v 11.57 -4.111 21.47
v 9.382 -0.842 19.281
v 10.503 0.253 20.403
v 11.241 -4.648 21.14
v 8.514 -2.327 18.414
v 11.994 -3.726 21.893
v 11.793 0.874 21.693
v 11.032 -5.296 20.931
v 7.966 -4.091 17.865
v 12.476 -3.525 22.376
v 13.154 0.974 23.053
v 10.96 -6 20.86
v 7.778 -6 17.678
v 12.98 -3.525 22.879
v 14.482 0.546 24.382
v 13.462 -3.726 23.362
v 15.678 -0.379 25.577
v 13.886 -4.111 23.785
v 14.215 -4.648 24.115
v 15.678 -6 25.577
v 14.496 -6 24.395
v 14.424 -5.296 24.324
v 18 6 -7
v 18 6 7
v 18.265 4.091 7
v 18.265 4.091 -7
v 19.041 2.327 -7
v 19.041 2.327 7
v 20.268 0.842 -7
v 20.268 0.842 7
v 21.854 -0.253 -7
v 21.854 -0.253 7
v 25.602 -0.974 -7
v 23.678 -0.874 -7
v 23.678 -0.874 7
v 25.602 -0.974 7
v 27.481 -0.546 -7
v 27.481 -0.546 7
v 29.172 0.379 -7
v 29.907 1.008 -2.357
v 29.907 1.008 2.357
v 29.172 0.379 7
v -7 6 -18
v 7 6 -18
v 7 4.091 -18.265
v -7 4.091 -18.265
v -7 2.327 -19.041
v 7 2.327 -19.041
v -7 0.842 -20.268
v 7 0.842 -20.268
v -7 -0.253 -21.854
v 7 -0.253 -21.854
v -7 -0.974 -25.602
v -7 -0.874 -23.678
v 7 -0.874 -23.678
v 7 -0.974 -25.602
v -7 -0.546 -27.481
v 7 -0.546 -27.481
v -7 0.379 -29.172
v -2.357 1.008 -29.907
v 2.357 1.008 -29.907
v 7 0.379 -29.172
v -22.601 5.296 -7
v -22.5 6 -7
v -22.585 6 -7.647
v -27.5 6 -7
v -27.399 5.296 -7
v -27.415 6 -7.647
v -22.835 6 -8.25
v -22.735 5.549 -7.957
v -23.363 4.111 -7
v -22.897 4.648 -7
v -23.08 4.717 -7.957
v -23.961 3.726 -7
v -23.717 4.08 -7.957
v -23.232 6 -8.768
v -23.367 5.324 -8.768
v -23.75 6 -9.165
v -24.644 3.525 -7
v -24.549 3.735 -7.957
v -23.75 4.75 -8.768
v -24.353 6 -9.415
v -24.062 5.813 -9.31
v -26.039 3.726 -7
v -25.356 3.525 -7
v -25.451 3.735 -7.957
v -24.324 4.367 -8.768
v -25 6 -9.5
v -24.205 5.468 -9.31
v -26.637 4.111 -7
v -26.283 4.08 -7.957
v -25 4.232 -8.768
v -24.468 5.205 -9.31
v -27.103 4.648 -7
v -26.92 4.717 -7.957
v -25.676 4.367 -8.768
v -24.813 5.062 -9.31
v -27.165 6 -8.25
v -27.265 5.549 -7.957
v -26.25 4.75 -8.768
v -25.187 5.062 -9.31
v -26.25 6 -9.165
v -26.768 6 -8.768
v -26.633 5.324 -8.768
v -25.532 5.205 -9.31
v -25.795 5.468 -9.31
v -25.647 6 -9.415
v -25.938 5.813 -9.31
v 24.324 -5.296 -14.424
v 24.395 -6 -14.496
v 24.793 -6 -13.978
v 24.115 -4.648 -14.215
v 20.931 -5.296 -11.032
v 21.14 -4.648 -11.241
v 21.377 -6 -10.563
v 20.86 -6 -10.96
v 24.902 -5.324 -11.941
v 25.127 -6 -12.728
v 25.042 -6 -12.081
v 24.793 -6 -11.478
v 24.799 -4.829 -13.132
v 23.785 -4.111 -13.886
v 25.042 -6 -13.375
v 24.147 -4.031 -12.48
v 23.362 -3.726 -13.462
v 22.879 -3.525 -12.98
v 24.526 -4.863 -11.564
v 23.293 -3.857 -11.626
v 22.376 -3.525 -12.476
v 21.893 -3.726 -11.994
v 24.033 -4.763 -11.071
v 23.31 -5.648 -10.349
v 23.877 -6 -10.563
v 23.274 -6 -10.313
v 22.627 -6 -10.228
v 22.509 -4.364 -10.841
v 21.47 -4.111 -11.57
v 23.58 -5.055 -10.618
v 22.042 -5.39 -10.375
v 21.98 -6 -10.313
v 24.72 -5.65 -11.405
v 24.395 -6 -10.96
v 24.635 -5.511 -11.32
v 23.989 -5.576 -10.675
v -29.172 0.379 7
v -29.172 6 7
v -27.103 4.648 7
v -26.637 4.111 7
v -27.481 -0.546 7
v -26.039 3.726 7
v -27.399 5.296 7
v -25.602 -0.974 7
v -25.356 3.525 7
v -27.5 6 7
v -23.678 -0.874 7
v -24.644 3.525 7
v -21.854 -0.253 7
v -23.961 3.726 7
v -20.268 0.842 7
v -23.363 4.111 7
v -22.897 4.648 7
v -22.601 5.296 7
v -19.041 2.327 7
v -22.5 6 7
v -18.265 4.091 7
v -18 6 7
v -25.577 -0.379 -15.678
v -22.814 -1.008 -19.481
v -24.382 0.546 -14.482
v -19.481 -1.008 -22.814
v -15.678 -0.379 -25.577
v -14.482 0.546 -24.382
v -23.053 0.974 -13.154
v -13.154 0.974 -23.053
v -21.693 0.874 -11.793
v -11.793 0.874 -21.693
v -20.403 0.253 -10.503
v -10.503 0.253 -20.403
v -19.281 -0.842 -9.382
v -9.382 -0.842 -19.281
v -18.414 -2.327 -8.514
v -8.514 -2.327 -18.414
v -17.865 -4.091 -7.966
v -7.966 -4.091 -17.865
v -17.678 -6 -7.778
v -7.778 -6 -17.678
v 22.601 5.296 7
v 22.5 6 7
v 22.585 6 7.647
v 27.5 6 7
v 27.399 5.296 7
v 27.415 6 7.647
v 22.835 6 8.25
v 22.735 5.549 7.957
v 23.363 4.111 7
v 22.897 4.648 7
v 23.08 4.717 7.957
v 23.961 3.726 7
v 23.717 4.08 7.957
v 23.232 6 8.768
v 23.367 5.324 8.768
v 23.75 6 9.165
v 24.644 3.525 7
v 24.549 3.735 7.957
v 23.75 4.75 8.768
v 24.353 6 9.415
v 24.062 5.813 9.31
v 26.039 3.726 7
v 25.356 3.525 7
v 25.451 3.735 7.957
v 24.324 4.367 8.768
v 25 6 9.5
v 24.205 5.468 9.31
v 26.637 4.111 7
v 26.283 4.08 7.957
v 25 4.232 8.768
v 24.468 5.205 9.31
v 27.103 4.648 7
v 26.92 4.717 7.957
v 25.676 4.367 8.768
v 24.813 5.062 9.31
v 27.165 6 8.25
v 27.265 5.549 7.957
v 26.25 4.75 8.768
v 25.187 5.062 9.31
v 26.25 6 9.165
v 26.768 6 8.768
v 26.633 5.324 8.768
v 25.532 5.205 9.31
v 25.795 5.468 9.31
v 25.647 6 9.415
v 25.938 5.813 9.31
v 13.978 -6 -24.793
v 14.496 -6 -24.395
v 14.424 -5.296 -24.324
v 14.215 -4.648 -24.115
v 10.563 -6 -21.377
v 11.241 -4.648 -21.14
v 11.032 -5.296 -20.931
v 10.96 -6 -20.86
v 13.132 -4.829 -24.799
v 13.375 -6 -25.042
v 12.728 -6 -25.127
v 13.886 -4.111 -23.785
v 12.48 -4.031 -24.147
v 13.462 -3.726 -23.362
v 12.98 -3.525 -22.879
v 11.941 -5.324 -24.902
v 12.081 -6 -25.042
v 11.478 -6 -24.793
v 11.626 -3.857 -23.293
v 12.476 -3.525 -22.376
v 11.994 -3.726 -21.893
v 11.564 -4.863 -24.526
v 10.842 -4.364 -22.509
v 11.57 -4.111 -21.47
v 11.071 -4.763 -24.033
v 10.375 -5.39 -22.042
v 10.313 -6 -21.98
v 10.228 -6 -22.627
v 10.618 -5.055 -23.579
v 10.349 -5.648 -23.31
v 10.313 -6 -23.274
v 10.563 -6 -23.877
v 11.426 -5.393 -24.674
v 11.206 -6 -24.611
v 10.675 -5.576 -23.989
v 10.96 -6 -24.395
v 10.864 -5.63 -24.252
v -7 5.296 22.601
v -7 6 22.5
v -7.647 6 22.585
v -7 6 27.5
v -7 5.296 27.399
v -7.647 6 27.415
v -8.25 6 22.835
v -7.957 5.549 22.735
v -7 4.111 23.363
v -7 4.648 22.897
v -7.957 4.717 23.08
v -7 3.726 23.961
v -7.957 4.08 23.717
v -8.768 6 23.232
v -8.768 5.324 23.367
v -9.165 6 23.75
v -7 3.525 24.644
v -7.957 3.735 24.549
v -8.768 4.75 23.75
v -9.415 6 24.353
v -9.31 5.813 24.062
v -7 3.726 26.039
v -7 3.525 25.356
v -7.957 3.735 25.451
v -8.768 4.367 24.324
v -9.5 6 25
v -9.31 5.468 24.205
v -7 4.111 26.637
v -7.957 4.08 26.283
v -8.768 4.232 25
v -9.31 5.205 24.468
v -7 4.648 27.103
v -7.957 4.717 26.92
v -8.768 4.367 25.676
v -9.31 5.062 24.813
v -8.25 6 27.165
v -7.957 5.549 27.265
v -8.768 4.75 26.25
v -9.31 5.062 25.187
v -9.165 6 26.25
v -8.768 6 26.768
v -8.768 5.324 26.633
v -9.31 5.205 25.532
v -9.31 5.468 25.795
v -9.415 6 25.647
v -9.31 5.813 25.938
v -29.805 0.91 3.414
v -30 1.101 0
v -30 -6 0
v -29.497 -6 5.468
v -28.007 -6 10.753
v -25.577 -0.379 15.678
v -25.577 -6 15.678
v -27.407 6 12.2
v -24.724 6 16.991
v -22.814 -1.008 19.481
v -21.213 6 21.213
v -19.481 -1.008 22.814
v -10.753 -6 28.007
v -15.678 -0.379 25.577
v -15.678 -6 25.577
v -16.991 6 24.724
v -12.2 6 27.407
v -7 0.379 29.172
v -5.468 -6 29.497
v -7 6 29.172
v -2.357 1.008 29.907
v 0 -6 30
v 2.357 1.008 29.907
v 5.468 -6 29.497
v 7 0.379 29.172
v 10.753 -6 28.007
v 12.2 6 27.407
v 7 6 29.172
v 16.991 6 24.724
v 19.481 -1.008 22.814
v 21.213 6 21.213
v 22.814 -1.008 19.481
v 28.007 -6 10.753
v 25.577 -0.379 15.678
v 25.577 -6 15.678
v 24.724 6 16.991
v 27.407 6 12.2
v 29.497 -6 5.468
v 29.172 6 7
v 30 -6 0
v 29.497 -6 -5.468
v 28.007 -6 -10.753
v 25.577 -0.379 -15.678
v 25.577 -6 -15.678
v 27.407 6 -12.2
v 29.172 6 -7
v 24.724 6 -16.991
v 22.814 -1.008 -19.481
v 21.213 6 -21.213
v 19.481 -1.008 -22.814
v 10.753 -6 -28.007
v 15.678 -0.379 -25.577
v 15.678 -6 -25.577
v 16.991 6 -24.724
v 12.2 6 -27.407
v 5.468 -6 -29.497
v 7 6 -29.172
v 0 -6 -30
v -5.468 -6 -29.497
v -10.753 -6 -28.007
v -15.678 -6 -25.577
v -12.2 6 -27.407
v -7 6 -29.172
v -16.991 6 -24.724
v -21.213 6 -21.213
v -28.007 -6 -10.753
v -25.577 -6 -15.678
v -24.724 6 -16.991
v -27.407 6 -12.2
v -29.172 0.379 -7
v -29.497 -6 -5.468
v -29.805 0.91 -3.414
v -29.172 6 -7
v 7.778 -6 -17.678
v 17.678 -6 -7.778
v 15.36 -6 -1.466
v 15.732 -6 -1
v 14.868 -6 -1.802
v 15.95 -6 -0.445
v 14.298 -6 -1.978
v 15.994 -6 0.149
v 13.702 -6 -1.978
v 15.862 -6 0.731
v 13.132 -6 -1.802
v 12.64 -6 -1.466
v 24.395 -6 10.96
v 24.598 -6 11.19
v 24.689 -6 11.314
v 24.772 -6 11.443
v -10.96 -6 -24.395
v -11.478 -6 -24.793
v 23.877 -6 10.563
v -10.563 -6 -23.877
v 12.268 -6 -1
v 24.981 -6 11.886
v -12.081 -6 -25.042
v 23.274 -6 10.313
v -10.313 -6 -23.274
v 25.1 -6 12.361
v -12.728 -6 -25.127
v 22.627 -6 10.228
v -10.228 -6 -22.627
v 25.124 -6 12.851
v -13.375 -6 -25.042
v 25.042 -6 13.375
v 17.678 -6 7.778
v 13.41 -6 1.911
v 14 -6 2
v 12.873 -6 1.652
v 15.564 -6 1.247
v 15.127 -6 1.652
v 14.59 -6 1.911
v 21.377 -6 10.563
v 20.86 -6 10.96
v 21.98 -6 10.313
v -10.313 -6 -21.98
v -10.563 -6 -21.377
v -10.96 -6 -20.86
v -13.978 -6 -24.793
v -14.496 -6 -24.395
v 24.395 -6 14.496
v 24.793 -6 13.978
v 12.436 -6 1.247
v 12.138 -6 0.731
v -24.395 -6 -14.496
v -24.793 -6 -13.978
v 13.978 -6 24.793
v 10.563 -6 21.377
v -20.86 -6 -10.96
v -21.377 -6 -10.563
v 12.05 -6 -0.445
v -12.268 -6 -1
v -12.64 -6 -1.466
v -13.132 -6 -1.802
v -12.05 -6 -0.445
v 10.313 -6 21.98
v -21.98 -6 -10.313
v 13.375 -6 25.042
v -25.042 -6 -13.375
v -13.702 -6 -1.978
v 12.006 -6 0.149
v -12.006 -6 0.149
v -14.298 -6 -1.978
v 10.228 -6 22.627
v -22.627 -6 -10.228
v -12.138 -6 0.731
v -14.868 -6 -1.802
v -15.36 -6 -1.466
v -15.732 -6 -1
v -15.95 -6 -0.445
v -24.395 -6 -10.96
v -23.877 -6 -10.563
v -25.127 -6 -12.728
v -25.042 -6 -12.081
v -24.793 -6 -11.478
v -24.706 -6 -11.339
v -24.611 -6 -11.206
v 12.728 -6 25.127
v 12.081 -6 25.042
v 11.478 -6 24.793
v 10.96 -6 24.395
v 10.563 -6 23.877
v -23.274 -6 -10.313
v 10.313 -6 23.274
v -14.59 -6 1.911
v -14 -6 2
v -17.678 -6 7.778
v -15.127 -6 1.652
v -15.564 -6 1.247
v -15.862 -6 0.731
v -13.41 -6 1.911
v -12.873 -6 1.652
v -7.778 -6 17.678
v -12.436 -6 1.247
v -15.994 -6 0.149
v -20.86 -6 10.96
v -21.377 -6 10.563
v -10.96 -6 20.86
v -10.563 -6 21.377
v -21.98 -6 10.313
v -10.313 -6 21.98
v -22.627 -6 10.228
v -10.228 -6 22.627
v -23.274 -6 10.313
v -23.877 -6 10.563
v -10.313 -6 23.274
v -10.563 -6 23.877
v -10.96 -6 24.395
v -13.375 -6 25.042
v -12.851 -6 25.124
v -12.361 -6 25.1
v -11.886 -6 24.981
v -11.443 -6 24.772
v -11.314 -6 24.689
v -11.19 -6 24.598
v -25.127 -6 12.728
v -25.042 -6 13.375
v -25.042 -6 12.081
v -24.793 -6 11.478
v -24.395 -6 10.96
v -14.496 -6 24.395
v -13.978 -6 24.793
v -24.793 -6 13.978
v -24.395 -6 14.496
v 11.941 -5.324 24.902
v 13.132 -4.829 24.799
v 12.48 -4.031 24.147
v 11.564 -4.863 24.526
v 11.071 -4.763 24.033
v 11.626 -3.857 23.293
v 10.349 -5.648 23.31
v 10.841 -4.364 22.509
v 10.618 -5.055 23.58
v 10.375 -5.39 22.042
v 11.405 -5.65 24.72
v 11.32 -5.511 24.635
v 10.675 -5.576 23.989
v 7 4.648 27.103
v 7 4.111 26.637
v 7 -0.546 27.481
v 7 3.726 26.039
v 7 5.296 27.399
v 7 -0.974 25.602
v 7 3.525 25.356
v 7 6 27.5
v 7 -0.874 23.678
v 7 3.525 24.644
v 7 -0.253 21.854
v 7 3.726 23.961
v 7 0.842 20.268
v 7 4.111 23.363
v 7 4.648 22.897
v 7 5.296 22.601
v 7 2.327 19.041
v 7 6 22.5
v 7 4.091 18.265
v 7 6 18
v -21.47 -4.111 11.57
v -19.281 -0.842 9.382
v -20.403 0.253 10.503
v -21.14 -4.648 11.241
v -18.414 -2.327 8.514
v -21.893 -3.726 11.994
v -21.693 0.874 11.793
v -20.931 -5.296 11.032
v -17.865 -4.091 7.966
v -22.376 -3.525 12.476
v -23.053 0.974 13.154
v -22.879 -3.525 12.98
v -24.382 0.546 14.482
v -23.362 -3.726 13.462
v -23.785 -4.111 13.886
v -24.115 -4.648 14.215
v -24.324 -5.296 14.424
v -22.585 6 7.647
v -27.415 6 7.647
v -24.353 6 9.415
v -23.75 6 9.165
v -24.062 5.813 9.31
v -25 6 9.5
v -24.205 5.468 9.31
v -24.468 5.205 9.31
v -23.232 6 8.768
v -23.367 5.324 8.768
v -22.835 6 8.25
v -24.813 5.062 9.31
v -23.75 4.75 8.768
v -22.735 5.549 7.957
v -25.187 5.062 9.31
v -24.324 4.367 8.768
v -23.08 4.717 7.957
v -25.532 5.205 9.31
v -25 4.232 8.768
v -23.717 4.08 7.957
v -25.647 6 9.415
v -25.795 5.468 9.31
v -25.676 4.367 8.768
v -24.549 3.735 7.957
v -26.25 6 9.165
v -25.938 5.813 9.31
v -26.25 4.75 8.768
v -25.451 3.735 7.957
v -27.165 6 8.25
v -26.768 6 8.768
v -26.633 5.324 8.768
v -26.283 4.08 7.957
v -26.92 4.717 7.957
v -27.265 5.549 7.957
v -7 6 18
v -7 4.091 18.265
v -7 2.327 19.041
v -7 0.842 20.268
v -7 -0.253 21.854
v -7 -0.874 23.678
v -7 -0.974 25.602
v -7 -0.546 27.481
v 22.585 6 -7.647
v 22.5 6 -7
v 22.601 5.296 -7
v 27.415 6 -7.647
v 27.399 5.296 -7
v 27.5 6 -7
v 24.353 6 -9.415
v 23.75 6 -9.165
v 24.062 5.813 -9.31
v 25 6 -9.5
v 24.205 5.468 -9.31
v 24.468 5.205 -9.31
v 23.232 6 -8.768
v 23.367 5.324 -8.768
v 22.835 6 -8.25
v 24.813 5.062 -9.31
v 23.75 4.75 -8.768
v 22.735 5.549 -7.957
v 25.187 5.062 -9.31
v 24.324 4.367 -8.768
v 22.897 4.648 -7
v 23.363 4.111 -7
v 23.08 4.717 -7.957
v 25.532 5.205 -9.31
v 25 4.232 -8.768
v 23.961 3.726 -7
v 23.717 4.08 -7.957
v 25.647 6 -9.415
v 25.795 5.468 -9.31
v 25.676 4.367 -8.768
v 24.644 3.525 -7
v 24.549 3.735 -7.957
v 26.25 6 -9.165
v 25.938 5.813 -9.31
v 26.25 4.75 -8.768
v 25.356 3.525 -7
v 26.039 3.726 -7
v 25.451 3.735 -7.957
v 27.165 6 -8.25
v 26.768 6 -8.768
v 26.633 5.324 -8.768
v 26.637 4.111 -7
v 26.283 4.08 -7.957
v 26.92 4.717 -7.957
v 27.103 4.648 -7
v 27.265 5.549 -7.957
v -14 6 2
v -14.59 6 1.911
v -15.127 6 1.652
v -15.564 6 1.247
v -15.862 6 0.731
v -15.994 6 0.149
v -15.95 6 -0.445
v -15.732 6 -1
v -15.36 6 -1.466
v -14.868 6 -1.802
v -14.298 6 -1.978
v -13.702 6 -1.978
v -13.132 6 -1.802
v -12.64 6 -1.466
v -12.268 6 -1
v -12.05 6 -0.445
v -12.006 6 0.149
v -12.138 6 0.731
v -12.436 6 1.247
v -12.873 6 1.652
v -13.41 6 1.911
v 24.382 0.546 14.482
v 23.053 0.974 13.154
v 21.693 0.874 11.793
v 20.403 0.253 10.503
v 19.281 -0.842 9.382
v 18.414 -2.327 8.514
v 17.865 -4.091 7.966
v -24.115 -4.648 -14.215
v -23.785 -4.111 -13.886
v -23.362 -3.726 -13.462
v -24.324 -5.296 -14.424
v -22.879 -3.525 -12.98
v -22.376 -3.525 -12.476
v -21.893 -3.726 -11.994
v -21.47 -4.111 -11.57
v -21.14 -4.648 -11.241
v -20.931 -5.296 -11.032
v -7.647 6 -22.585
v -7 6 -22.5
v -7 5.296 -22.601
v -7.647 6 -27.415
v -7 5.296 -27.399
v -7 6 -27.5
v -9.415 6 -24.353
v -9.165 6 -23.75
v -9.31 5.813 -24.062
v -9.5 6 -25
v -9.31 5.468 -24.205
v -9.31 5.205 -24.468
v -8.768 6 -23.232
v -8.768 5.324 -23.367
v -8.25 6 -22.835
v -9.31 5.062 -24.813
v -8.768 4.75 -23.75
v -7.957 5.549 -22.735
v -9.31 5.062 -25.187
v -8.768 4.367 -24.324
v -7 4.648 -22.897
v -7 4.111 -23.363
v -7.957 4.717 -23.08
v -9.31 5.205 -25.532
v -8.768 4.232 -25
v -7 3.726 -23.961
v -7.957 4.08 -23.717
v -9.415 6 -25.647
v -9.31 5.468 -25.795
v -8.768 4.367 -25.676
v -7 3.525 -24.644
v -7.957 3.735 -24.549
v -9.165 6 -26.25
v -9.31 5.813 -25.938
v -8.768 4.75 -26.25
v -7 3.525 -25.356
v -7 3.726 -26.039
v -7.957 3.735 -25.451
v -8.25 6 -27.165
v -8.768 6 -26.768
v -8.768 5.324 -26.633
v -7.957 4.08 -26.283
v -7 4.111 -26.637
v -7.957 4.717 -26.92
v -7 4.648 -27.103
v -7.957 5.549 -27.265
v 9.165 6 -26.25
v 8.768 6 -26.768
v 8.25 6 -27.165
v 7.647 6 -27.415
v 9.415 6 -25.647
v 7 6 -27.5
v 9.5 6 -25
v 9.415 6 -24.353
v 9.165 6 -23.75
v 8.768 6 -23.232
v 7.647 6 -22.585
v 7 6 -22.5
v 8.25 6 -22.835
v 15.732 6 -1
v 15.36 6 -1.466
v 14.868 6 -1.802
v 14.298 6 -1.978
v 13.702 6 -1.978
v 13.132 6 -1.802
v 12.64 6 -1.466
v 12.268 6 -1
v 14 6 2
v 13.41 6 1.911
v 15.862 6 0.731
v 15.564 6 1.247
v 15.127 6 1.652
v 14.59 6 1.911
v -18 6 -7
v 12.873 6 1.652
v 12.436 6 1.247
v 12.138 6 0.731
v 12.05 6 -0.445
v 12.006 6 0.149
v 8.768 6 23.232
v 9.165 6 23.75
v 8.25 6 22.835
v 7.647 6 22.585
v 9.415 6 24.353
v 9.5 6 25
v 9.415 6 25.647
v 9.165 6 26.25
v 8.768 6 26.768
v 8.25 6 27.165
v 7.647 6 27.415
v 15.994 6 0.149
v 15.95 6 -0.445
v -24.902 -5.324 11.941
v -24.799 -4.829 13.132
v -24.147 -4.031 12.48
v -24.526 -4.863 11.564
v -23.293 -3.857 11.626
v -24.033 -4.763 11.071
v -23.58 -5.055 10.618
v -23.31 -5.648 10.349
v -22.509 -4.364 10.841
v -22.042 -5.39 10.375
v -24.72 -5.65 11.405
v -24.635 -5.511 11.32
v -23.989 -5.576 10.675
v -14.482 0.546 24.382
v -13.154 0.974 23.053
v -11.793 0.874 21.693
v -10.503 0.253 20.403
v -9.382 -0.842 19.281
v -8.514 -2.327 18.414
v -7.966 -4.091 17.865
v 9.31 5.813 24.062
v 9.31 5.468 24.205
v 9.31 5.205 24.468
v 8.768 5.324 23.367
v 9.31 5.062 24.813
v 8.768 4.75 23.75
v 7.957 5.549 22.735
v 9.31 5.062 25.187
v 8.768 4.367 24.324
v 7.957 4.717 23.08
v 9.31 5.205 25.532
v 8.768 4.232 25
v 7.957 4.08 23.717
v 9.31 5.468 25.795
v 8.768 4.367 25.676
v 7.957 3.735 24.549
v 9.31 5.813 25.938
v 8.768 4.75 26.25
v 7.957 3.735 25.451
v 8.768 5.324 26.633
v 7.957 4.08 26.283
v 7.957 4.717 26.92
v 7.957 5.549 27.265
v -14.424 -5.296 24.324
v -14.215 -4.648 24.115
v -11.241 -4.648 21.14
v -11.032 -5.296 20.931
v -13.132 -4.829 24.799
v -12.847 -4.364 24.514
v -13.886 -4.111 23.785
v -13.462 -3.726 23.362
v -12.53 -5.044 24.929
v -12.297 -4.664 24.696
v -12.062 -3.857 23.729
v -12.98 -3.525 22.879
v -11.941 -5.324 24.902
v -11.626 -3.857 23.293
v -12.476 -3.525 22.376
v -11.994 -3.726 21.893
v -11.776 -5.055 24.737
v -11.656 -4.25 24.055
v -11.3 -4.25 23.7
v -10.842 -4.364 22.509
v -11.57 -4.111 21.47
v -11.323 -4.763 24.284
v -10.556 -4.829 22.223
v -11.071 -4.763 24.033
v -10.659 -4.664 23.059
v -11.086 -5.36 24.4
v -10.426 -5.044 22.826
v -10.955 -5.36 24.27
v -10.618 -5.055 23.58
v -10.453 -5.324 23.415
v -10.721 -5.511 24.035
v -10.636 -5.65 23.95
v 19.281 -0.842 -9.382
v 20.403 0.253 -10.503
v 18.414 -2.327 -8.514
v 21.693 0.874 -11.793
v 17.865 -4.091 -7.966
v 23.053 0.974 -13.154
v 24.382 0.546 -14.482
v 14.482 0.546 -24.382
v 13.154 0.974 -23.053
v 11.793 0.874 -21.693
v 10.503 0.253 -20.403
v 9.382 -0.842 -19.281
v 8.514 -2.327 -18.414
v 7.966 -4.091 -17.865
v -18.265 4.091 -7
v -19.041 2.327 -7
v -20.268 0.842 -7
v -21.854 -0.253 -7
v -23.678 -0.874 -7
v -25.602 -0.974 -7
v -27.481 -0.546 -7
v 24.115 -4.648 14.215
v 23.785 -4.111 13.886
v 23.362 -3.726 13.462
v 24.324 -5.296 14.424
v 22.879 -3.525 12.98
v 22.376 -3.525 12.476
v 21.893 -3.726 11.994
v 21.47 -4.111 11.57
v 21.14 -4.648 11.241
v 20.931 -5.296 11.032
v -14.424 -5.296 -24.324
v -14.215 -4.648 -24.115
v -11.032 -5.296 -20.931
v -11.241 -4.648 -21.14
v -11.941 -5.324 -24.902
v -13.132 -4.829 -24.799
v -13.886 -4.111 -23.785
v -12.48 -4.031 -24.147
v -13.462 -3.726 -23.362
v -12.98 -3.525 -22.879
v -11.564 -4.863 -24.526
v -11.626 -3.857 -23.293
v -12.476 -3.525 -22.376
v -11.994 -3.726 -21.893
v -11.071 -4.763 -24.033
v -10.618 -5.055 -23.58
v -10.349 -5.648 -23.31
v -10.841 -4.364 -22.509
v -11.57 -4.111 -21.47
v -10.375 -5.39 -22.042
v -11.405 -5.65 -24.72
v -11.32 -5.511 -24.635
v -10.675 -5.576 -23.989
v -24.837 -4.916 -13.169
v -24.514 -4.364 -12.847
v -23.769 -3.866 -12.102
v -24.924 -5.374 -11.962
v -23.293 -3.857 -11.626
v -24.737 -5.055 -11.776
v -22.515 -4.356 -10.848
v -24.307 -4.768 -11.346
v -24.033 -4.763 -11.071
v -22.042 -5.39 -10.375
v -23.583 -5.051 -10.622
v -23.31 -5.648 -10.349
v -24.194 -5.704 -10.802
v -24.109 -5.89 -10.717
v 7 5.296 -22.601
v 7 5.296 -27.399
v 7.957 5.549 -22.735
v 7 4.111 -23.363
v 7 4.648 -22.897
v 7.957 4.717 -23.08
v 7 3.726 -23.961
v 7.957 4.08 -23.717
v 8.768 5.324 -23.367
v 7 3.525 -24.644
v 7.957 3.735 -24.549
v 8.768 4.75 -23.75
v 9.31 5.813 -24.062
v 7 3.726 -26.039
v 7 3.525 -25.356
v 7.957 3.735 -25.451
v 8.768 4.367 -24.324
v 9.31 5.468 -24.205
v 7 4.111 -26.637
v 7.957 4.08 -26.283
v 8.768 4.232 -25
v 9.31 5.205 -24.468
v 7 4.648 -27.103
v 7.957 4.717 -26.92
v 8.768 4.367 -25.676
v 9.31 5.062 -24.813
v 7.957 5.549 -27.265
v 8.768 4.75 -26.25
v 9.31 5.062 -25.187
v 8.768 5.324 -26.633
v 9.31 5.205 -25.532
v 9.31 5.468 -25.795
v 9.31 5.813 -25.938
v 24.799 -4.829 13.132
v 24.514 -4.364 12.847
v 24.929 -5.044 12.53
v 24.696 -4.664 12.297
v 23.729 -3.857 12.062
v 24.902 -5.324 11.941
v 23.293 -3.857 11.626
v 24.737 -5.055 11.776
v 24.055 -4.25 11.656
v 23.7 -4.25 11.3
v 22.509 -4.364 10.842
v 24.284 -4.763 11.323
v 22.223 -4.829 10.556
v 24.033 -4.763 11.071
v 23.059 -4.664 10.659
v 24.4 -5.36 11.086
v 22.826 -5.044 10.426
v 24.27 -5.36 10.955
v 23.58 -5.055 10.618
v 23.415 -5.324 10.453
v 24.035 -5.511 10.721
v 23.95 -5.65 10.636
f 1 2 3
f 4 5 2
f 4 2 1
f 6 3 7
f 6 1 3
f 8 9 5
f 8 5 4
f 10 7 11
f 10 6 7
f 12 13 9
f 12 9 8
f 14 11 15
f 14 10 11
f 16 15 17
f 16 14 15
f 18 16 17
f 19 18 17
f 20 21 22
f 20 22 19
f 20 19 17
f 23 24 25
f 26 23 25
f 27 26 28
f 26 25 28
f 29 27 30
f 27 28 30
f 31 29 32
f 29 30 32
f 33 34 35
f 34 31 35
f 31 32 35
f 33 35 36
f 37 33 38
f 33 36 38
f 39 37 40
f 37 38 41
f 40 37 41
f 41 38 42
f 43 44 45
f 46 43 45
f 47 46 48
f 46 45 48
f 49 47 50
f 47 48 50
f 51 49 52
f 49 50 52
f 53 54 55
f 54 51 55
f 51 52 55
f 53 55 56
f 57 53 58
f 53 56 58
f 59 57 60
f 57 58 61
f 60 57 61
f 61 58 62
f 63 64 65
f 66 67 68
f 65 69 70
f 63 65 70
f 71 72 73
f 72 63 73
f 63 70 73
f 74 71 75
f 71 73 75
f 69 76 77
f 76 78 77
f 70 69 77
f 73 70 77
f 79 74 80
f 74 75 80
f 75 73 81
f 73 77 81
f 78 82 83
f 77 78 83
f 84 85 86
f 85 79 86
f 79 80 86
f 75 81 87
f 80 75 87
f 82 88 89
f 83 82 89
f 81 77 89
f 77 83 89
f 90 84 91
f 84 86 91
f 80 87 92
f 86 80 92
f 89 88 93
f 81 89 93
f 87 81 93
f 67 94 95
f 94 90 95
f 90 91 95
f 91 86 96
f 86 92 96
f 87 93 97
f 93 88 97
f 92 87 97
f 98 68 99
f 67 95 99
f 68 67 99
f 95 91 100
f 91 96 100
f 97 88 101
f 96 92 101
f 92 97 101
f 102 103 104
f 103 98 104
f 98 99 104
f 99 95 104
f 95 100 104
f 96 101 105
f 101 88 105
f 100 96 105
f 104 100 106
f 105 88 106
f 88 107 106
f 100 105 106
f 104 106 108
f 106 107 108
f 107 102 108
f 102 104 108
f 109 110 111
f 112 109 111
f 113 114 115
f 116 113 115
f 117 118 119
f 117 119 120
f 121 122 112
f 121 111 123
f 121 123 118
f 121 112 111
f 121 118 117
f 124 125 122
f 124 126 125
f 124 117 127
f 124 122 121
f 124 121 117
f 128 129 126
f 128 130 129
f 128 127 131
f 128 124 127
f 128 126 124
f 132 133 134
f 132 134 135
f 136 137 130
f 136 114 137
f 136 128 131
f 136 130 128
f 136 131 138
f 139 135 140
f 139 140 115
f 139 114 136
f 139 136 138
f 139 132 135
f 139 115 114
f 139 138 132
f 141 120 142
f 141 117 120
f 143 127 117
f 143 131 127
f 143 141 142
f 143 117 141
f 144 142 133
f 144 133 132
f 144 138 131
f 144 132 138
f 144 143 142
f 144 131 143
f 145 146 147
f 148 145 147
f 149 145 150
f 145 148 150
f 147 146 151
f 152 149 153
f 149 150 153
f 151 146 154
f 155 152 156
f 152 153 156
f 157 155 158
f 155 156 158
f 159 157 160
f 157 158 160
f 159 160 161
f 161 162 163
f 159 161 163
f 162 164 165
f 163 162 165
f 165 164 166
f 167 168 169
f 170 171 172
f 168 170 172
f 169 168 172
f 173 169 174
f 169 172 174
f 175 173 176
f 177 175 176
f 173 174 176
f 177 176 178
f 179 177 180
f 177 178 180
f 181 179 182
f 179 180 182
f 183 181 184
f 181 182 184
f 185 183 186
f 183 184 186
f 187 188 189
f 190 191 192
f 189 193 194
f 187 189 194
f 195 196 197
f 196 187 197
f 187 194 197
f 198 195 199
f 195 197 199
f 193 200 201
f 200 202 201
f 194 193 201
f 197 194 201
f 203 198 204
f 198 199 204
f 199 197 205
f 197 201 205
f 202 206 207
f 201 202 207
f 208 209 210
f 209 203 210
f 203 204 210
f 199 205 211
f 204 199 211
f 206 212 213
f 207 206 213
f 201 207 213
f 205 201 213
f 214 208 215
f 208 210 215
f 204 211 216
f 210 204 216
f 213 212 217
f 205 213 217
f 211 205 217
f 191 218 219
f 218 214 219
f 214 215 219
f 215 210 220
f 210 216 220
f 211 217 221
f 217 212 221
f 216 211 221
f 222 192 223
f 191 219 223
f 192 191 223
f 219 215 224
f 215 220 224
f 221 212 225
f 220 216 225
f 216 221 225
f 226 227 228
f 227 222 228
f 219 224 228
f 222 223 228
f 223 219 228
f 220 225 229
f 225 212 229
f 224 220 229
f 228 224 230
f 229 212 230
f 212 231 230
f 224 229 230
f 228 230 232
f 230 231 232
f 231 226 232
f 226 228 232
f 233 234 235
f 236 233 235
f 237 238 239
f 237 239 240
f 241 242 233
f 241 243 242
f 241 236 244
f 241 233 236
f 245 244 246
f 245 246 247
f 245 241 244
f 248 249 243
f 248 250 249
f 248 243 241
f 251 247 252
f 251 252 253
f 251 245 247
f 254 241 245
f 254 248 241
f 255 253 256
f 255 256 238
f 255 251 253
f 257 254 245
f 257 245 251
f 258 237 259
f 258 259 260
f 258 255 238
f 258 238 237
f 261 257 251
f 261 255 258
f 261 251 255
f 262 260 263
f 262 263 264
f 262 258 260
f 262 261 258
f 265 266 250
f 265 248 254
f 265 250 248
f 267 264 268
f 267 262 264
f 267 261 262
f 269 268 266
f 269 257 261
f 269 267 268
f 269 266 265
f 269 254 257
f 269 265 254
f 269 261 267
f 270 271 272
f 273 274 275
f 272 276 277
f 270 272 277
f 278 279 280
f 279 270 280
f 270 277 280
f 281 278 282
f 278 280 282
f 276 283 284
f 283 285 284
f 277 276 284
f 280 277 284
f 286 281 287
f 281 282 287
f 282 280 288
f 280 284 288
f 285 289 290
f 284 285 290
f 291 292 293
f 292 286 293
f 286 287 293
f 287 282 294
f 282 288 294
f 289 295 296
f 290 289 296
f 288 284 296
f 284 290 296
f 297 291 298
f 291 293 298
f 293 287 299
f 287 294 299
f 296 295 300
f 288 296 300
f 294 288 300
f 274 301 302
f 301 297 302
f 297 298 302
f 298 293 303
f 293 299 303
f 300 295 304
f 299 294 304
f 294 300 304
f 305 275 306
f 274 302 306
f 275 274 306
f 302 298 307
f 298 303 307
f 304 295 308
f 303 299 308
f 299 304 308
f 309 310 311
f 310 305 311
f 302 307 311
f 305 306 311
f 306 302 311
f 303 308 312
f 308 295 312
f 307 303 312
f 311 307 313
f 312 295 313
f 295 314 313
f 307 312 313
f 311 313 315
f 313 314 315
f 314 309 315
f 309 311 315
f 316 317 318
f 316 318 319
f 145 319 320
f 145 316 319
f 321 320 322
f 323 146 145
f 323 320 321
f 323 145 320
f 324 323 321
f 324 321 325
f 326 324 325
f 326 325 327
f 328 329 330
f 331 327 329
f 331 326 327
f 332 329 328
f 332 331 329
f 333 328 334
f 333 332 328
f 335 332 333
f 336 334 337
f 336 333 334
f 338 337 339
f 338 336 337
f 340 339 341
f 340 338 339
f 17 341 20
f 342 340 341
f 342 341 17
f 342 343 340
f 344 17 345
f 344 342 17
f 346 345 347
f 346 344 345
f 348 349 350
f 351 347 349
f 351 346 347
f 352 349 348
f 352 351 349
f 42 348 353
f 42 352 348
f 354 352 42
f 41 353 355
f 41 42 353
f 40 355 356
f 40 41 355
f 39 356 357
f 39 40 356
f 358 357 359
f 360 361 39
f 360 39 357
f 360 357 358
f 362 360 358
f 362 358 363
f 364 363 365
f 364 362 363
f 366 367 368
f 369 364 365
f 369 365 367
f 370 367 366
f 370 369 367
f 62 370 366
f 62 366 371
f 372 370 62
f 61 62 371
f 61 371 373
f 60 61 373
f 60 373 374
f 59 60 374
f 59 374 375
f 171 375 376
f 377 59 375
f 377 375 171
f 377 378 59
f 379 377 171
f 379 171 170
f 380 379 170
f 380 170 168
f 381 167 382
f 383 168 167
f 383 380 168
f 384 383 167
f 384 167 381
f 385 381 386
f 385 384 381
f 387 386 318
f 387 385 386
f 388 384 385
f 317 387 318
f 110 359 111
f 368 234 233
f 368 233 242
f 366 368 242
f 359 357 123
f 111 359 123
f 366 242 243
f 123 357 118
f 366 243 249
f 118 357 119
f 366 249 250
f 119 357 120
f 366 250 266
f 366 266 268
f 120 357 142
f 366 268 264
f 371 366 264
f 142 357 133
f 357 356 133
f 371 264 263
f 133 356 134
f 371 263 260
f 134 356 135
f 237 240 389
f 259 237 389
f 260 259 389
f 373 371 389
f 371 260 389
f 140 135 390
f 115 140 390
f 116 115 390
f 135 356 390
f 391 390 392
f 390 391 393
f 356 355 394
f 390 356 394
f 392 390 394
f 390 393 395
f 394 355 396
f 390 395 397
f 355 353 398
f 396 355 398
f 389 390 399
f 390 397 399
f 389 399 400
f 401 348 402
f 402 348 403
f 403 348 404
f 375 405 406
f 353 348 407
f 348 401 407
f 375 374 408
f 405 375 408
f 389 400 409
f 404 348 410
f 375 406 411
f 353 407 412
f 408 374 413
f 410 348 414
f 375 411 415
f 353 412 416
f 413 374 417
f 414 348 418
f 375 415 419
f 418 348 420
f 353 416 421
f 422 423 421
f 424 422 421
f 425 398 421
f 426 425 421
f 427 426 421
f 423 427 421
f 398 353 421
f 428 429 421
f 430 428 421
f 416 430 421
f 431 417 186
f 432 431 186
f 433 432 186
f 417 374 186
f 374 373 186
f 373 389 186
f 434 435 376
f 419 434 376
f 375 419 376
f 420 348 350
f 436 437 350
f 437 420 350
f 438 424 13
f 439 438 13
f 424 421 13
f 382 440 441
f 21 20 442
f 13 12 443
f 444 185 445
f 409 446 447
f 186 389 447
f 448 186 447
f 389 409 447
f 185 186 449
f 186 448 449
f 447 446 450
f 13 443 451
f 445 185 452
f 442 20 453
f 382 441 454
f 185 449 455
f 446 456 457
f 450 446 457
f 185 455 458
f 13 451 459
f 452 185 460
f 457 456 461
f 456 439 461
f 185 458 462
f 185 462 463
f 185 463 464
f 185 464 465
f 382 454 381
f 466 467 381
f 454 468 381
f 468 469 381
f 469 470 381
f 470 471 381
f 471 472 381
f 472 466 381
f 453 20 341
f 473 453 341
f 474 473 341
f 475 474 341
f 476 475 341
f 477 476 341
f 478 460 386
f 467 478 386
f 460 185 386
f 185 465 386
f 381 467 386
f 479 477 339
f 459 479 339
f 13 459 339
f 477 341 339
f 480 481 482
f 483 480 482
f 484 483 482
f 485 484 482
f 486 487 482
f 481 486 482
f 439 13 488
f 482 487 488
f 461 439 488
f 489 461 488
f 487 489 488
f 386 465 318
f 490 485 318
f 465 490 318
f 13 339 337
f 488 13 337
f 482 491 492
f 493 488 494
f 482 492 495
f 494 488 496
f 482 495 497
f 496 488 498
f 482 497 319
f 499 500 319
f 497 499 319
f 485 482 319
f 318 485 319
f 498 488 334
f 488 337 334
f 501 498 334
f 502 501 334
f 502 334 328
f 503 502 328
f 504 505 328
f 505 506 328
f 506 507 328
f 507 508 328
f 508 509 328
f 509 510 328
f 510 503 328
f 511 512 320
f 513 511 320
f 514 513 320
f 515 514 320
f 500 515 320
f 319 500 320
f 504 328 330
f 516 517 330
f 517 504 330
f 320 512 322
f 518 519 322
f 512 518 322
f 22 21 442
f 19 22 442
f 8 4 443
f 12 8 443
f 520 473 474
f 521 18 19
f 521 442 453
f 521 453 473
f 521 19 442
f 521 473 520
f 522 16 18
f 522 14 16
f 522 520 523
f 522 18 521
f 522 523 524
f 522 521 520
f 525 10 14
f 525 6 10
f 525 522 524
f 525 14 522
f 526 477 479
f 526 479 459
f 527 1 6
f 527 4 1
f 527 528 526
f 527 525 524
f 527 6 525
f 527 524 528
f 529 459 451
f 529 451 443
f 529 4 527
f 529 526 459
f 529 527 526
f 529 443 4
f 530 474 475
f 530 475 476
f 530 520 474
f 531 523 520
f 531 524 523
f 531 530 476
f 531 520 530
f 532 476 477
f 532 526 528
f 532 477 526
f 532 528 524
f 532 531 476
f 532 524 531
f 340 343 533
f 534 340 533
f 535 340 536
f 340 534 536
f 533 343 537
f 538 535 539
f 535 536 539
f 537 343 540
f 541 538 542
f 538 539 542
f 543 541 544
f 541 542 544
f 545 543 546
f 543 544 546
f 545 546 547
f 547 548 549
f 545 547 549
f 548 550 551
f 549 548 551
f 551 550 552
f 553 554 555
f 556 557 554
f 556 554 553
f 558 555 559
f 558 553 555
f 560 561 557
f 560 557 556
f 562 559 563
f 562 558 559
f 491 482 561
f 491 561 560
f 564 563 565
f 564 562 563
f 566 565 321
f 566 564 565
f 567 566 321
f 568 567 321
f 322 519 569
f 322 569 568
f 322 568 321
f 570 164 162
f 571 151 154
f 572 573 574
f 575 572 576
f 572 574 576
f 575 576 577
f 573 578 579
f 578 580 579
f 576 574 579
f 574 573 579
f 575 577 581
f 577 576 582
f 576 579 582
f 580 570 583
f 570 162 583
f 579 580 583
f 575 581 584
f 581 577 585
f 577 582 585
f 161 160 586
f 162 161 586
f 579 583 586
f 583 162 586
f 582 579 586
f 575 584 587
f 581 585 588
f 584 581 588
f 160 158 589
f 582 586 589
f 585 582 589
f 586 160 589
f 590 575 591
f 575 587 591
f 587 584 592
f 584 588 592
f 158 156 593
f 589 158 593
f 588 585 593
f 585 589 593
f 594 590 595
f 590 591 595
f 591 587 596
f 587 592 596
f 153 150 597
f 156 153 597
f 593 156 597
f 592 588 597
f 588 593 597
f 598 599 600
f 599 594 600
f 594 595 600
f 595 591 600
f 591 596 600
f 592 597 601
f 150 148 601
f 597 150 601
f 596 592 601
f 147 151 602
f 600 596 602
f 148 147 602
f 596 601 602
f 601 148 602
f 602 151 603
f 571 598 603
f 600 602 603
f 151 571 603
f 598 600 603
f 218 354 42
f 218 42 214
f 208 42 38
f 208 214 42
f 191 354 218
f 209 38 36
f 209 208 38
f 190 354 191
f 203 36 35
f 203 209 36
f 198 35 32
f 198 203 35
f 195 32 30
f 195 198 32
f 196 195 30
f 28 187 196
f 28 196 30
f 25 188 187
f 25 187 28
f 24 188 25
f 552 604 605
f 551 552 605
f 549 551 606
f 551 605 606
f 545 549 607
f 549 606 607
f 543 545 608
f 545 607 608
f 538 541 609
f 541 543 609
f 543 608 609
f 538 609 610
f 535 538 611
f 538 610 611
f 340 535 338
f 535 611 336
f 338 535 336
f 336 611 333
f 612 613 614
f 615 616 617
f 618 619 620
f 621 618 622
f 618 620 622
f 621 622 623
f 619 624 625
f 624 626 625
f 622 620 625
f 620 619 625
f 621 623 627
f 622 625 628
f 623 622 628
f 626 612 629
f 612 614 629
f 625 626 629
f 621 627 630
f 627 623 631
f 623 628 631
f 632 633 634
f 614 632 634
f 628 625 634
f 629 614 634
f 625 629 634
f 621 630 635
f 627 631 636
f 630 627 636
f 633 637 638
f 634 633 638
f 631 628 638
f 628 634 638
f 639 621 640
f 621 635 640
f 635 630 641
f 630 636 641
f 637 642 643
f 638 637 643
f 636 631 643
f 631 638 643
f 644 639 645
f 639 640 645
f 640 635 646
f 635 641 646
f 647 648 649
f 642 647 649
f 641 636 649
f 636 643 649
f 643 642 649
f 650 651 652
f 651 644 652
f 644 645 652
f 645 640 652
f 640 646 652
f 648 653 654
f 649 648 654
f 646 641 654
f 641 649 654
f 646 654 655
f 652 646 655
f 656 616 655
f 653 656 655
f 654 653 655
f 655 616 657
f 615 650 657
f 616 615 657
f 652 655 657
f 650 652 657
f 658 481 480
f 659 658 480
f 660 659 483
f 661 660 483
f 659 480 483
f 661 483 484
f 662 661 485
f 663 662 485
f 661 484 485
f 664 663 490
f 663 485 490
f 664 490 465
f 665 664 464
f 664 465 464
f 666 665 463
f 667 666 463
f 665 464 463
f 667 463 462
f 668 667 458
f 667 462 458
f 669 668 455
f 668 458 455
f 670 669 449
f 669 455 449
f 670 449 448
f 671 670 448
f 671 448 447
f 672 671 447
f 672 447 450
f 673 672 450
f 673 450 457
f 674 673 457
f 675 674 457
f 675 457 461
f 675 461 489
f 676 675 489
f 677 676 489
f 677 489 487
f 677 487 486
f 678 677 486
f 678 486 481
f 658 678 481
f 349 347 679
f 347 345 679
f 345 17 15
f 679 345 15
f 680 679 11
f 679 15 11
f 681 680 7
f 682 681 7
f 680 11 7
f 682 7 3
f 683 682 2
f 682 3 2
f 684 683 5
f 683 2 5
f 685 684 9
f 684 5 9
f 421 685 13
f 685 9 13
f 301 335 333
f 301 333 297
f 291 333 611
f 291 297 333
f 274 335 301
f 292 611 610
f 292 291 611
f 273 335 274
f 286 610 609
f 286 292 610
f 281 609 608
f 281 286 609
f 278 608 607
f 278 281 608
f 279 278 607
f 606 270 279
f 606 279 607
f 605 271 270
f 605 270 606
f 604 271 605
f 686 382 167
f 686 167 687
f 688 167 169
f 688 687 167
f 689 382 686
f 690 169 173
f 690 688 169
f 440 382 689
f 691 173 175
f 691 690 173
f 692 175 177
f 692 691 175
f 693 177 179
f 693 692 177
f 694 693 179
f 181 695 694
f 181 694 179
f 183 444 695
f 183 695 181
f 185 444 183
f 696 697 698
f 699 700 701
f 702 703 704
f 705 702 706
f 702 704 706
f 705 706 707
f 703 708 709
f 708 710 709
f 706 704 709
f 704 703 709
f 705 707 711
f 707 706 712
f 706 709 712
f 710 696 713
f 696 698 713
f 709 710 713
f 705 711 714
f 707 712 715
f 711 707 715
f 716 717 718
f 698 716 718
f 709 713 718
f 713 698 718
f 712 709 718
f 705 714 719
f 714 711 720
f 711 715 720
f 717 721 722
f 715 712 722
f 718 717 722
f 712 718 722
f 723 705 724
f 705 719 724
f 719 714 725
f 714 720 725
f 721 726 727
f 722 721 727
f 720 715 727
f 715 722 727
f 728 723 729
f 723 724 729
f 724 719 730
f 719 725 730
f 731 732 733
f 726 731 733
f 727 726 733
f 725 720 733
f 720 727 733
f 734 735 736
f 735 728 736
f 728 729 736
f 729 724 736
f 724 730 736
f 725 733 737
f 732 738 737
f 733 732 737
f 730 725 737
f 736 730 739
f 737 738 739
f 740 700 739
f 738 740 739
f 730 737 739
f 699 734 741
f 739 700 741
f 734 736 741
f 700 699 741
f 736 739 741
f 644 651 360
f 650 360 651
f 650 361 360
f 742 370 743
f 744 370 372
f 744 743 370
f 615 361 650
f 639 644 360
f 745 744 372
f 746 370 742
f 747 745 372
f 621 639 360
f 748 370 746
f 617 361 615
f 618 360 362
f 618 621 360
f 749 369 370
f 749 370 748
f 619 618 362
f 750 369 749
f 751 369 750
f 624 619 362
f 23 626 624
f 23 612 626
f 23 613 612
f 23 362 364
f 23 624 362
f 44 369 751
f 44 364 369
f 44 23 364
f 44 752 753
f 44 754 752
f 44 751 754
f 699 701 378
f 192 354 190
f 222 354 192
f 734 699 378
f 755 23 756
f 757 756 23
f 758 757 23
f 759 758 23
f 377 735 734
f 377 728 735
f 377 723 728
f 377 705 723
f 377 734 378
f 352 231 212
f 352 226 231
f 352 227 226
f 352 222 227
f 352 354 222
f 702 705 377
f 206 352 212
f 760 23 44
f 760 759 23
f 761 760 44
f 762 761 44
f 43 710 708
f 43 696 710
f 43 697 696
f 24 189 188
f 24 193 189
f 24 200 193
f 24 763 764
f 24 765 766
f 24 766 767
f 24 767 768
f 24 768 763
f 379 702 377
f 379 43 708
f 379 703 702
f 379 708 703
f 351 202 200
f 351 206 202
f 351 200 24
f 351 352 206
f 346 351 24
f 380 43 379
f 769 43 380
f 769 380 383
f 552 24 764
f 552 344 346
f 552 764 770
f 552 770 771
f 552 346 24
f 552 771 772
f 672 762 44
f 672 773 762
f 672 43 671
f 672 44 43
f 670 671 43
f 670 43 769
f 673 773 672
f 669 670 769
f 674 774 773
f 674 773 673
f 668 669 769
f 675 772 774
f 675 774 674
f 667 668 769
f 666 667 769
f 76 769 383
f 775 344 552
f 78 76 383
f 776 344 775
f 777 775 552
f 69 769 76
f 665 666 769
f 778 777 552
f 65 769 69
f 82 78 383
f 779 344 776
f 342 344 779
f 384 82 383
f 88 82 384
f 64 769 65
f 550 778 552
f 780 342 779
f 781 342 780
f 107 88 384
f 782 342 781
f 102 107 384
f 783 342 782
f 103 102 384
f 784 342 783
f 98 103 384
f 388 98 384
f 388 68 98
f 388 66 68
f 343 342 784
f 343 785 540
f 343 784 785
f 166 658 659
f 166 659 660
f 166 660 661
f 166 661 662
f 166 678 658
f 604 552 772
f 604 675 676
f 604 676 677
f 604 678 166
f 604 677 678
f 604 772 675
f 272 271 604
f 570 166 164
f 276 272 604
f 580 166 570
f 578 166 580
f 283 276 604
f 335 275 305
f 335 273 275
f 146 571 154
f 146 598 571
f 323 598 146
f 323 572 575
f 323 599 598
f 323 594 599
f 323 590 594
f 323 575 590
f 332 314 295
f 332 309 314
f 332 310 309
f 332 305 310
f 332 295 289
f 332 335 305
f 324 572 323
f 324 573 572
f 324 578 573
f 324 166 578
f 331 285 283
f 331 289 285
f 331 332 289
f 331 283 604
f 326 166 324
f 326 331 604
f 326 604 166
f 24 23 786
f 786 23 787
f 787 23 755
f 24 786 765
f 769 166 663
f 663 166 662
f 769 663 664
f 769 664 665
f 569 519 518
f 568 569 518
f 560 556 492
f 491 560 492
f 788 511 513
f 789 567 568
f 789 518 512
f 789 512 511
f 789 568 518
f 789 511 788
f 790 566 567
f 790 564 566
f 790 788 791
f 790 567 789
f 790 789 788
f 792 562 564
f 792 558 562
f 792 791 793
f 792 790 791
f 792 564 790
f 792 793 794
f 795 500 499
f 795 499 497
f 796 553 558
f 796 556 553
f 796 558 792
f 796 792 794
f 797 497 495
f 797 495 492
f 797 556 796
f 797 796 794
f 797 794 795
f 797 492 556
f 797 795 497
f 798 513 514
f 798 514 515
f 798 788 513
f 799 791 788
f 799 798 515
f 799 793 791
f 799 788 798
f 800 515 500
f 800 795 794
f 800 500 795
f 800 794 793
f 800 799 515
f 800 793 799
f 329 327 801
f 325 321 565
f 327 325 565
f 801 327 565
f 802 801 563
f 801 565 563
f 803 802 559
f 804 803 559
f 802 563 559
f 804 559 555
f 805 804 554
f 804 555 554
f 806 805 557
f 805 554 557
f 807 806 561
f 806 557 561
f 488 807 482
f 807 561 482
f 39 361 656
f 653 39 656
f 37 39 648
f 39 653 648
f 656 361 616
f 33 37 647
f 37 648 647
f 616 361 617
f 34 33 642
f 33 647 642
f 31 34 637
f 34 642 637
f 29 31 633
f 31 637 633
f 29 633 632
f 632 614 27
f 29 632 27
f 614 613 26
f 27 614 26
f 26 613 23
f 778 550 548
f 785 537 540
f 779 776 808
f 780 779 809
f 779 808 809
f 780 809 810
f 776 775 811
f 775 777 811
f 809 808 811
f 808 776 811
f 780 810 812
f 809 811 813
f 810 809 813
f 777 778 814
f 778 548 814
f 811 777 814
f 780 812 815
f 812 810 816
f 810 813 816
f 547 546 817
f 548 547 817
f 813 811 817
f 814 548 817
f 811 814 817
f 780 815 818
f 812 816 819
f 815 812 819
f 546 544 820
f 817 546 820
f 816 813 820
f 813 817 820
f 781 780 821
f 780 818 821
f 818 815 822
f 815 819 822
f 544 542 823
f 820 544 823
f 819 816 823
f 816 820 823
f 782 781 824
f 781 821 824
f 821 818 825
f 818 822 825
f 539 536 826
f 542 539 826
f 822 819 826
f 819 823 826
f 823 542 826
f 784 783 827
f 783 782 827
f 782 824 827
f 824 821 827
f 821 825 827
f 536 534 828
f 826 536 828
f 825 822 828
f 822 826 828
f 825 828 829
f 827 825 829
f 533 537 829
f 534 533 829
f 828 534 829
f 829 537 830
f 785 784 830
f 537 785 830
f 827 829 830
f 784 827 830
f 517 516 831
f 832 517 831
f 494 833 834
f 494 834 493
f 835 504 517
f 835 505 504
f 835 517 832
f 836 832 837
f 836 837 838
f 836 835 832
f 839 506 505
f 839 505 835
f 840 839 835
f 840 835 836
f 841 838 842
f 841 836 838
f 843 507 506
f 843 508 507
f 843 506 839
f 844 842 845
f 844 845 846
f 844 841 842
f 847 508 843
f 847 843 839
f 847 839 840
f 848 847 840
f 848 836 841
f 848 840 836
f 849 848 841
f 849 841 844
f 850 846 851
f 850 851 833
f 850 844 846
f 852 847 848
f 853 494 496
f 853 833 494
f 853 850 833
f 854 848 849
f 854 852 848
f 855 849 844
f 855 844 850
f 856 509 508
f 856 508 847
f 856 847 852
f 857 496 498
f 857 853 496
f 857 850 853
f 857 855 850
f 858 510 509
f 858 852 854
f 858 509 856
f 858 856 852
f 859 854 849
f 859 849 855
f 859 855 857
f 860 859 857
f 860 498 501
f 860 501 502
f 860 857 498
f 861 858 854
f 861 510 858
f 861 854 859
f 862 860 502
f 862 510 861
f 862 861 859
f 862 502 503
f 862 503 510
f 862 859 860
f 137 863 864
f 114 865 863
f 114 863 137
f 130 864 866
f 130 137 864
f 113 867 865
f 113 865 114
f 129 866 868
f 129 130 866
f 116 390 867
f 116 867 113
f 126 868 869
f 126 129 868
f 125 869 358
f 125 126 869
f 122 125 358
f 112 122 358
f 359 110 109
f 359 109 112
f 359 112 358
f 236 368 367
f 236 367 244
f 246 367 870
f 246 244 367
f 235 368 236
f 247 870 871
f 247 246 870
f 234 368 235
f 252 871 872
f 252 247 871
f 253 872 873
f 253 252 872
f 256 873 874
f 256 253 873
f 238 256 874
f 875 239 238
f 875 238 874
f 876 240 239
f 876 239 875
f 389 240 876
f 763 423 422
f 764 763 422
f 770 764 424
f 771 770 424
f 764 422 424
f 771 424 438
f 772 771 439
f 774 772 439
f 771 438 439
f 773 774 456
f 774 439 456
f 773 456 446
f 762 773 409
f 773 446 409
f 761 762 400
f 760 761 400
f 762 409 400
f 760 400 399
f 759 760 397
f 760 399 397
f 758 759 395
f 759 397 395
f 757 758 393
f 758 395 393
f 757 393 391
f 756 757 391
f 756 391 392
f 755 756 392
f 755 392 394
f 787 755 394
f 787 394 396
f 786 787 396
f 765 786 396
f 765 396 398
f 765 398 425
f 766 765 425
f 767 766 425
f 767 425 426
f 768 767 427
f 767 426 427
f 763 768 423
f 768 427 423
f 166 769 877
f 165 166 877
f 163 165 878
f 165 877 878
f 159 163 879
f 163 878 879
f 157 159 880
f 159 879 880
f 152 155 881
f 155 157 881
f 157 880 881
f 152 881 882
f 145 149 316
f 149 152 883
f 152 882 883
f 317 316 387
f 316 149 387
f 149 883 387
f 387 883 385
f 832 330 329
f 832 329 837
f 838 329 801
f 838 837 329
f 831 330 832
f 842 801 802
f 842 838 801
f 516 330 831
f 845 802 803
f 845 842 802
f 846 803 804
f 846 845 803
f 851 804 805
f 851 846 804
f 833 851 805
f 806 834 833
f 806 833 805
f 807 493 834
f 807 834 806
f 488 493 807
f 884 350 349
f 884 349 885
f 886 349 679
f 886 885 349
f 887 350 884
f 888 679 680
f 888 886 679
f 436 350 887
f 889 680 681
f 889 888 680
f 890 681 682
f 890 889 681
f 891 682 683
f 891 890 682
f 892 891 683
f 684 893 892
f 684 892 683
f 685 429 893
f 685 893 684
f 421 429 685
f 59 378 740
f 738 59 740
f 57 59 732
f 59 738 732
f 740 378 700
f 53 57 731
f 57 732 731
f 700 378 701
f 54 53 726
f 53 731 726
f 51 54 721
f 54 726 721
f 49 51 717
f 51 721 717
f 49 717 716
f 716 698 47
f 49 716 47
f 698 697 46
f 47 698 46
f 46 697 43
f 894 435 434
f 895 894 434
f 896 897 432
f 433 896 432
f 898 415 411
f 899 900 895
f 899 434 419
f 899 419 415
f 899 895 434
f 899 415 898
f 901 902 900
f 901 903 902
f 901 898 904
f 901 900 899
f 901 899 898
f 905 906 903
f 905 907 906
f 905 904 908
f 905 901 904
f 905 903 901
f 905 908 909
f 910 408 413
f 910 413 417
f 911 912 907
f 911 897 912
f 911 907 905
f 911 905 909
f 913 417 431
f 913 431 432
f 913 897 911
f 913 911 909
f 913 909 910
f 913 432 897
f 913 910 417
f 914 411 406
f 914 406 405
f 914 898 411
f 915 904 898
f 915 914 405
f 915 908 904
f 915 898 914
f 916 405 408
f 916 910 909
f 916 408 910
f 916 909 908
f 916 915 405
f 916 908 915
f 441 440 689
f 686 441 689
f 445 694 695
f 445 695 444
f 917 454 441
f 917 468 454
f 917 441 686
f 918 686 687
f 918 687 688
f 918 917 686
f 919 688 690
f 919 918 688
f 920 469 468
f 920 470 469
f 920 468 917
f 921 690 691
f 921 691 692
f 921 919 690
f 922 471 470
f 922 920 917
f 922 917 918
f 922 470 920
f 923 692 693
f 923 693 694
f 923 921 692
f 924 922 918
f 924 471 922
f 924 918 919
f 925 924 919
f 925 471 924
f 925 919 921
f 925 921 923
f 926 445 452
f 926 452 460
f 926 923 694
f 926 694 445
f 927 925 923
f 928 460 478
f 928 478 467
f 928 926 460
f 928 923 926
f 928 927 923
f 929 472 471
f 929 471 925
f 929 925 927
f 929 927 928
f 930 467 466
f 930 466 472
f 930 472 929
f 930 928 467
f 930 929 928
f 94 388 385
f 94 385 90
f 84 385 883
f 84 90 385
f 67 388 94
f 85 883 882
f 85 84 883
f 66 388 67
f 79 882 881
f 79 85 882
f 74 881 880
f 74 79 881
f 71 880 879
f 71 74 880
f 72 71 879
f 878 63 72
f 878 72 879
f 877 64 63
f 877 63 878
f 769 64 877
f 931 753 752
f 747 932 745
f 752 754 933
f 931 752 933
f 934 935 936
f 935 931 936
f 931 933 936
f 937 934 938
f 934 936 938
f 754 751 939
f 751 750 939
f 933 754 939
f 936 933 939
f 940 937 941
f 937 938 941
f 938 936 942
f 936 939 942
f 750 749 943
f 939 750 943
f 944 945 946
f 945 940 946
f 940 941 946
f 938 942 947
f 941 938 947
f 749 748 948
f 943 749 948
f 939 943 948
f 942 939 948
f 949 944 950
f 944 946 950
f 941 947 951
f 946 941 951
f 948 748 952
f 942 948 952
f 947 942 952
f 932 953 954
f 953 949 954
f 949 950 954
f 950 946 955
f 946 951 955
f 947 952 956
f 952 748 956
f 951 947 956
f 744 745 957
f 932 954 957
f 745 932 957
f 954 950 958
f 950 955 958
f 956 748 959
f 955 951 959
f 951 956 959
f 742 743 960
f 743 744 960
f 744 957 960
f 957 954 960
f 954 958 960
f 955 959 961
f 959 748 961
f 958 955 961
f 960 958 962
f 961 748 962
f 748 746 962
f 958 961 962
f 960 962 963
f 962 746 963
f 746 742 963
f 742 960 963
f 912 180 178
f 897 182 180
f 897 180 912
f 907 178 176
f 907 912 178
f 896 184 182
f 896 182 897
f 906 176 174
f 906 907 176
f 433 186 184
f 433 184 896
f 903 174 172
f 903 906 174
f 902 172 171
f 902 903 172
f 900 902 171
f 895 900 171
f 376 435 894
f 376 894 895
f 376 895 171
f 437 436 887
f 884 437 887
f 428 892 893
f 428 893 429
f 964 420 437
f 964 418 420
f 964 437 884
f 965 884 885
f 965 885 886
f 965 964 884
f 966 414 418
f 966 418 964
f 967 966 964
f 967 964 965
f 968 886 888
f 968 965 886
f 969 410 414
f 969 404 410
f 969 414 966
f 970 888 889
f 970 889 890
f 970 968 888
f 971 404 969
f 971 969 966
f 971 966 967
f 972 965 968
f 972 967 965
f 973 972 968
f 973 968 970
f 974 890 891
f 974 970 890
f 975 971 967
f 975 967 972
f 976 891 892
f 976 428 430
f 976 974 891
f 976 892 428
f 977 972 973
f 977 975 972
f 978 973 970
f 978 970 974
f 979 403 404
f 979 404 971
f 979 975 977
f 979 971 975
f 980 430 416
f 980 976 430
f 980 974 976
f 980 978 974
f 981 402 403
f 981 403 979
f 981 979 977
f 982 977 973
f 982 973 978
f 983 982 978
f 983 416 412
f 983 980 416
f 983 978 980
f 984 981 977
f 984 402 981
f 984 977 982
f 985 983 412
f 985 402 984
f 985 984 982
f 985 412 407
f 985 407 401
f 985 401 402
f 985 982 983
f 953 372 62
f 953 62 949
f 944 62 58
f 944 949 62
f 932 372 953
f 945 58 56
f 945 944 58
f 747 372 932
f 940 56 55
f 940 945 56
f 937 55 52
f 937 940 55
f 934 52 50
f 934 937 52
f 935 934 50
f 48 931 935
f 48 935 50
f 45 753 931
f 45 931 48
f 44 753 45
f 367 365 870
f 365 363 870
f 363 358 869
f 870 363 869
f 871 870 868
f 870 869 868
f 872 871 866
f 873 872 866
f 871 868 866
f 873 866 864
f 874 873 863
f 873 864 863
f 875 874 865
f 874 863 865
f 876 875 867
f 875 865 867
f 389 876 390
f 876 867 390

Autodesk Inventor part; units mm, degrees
ref_plane "YZ Plane" through (0, 0, 0) normal (1, 0, 0) x (0, 1, 0)
ref_plane "XZ Plane" through (0, 0, 0) normal (0, 1, 0) x (-1, 0, 0)
ref_plane "XY Plane" through (0, 0, 0) normal (0, 0, 1) x (1, 0, 0)
sketch "Sketch1" plane through (0, 0, 0) normal (0, 1, 0) x (-1, 0, 0)
  circle A0 centre (0, 0) radius 30
  line L0 (-25, 7) -> (-18, 7)
  line L1 (-18, 7) -> (-18, -7)
  line L2 (-18, -7) -> (-25, -7)
  line L3 (-25, -7) -> (-25, 7)
  line L4 (-25, 7) -> (-18, -7) construction
  line L5 (-18, 7) -> (-25, -7) construction
  line L6 (-25, 7) -> (-25, 9.5)
  line L7 (-25, 7) -> (-22.5, 7)
  arc A1 (-22.5, 7) -> (-25, 9.5) centre (-25, 7) ccw
  line L8 (-25, -7) -> (-25, -9.5)
  line L9 (-25, -7) -> (-22.5, -7)
  arc A2 (-25, -9.5) -> (-22.5, -7) centre (-25, -7) ccw
  point P0 (-21.5, 0)
  dimension "d0" = 60
  dimension "d1" = 18
  dimension "d2" = 7
  dimension "d3" = 14
  dimension "d4" = 0
  dimension "d5" = 2.5
  dimension "d6" = 2.5
  dimension "d7" = 2.5
  dimension "d8" = 2.5
  dimension "d9" = 2.5
  dimension "d10" = 2.5
extrude "Extrusion1" add sketch "Sketch1" along normal mid plane 12 contours A0 | L6 A1 L0 | L0 L1 L2 L3 | L2 A2 L8
sketch "Sketch2" plane through (0, 6, 0) normal (0, 1, 0) x (1, 0, 0)
  line L0 (25, 7) -> (18, 7)
  line L1 (18, 7) -> (18, -7)
  line L2 (18, -7) -> (25, -7)
  line L3 (25, -7) -> (25, 7)
  line L4 (25, 7) -> (18, -7) construction
  line L5 (18, 7) -> (25, -7) construction
  arc A0 (25, -4.5) -> (25, -9.5) centre (25, -7) ccw
  arc A1 (25, 9.5) -> (25, 4.5) centre (25, 7) ccw
  line L6 (25, -9.5) -> (25, 9.5)
  point P0 (0, 0)
  point P1 (21.5, 0)
  dimension "d13" = 18
  dimension "d14" = 7
  dimension "d15" = 14
  dimension "d16" = 0
  dimension "d17" = 5
  dimension "d18" = 5
revolve "Revolution1" cut sketch "Sketch2" angle 360 about axis through (25, 6, 9.5) along (0, 0, -1)
pattern_circular "Circular Pattern1" count 4 over 360 about axis through (0, -10, 0) along (0, 1, 0) of "Revolution1"
sketch "Sketch3" plane through (0, -6, 0) normal (0, -1, 0) x (1, 0, 0)
  circle A0 centre (0, 0) radius 30 projected
  line L0 (0, 0) -> (-30, 0)
  line L1 (0, 0) -> (-17.6777, 17.6777)
  line L2 (-7.7782, 17.6777) -> (-17.6777, 7.7782)
  line L3 (-27.5772, 17.6777) -> (-17.6777, 27.5772)
  line L4 (-17.6777, 27.5772) -> (-17.6777, 7.7782) construction
  line L5 (-7.7782, 17.6777) -> (-27.5772, 17.6777) construction
  arc A1 (-14.4957, 20.8597) -> (-10.9602, 24.3952) centre (-12.7279, 22.6274) ccw
  arc A2 (-24.3952, 10.9602) -> (-20.8597, 14.4957) centre (-22.6274, 12.7279) ccw
  line L6 (-10.9602, 24.3952) -> (-24.3952, 10.9602)
  line L7 (-17.6777, 27.5772) -> (-14.4957, 24.3952)
  line L8 (-12.7279, 22.6274) -> (-7.7782, 17.6777)
  line L9 (-17.6777, 7.7782) -> (-22.6274, 12.7279)
  line L10 (-24.3952, 14.4957) -> (-27.5772, 17.6777)
  dimension "d23" = 25
  dimension "d24" = 45
  dimension "d25" = 14
  dimension "d26" = 90
  dimension "d27" = 14
  dimension "d28" = 5
  dimension "d29" = 5
revolve "Revolution2" cut sketch "Sketch3" angle 360 about axis through (-10.9602, -6, 24.3952) along (-0.7071, 0, -0.7071) contours L2 L9 A2 L6 L1 | L1 L6 A1 L8 L2 | L6 L8 A1 | A2 L9 L6 | L8 L6 A1 | A2 L6 L9
pattern_circular "Circular Pattern2" count 4 over 360 about axis through (0, -10, 0) along (0, 1, 0) of "Revolution2"
sketch "Sketch4" plane through (0, 6, 0) normal (0, 1, 0) x (1, 0, 0)
  point P0 (0, 0)
  point P1 (-14, 0)
  point P2 (14, 0)
  dimension "d34" = 14
  dimension "d35" = 14
hole "Hole1" at (-14, 6, 0) at (14, 6, 0) direction (0, -1, 0) diameter 4 end through all
properties part number "omni_wheel_core_2"
